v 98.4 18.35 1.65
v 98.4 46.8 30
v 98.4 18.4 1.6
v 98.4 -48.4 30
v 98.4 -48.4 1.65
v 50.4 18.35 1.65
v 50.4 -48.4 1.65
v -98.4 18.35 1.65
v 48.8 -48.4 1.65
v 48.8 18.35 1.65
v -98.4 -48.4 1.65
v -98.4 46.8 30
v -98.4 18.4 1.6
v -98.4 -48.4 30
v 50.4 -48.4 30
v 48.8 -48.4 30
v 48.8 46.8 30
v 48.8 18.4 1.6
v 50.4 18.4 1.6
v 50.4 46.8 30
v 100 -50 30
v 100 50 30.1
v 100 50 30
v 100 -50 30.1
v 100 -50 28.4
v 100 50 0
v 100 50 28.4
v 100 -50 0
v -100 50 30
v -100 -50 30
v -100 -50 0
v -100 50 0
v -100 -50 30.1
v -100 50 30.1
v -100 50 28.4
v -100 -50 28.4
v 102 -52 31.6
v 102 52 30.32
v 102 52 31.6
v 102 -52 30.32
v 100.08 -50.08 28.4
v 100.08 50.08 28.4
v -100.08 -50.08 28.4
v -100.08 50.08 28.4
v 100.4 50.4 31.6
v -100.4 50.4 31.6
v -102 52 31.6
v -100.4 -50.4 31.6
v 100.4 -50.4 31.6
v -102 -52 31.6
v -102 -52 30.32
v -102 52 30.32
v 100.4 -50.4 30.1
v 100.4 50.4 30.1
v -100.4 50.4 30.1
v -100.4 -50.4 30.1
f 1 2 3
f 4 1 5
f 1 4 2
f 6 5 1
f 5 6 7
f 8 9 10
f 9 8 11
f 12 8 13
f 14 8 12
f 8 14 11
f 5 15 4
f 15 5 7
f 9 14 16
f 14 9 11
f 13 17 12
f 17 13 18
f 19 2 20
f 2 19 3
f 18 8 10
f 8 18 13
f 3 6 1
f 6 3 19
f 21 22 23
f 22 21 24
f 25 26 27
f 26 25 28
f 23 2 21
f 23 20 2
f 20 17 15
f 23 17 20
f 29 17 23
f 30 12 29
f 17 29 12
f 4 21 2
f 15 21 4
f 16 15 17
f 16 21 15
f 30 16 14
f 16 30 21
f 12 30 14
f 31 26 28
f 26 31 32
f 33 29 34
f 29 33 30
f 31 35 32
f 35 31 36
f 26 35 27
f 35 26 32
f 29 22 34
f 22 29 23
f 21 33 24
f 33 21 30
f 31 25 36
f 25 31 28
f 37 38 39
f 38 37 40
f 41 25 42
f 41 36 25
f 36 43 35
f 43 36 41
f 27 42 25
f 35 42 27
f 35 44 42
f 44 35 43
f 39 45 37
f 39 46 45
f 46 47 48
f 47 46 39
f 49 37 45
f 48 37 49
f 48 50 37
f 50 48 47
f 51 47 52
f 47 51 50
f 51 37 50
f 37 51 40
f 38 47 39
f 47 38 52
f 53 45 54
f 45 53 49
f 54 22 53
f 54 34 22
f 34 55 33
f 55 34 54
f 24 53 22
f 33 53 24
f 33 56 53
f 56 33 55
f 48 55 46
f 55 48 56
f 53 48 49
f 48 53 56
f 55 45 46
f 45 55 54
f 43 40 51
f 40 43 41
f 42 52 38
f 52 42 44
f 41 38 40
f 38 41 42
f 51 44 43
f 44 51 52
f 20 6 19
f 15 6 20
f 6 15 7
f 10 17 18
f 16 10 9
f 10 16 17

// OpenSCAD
boxLen=200;
boxWid=100;
boxHgt=30;
boxThick=1.6;
numSections=4;
dividerCount=numSections-3;
straightSide=false;

slopeSections=4;

screwBox();

module screwBox() {
	difference() {
		// outerbox
		translate([0,0,boxHgt/2])
			cube([boxLen,boxWid,boxHgt],center=true);
		if (straightSide) {
			// innerbox
			translate([0,0,0.1+(boxHgt/2+boxThick/2)]) 
				cube([boxLen-boxThick*2,boxWid-boxThick*2,boxHgt-boxThick+0.1],center=true);
		} else {
			// innerbox
			translate([0,0-boxHgt/2,0.1+(boxHgt/2+boxThick/2)]) 
				cube([boxLen-boxThick*2,boxWid-boxHgt-boxThick*2,boxHgt-boxThick+0.1],center=true);
			// slope
			translate([0,boxWid/2-boxHgt-boxThick,boxHgt+boxThick]) 
				rotate([0,90,0])cylinder(boxLen-boxThick*2,boxHgt,boxHgt,center=true,$fn=slopeSections);
		}
	}
	// dividers
	for (sep=[1:dividerCount]) {
		translate([(boxLen-boxThick)/2-sep*(boxLen-boxThick)/numSections,0,boxHgt/2])
			cube([boxThick,boxWid,boxHgt],center=true);
	}
	// rim
	rotate([180,0,0])union() {
		translate([0,0,0-boxHgt])difference() {
			cube([boxLen+boxThick*2+0.8,boxWid+boxThick*2+0.8,boxThick*2],center=true);
			cube([boxLen,boxWid,boxThick*2+1],center=true);
			// extra cut out for stacking
			translate([0,0,0-boxThick/2-0.1])cube([boxLen+0.8,boxWid+0.8,boxThick],center=true);
			// 45 degree support for outer edge
			translate([0,boxWid/2+boxThick*1.05,boxThick*0.7071]) 
				rotate([45,0,0])cube([boxLen+boxThick*2+1,boxThick,boxThick*2],center=true);
			translate([0,0-(boxWid/2+boxThick*1.05),boxThick*0.7071]) 
				rotate([-45,0,0])cube([boxLen+boxThick*2+1,boxThick,boxThick*2],center=true);
			translate([boxLen/2+boxThick*1.05,0,boxThick*0.7071]) 
				rotate([0,-45,0])cube([boxThick,boxWid+boxThick*2+1,boxThick*2],center=true);
			translate([0-(boxLen/2+boxThick*1.05),0,boxThick*0.7071]) 
				rotate([0,45,0])cube([boxThick,boxWid+boxThick*2+1,boxThick*2],center=true);
		}
	}
}
